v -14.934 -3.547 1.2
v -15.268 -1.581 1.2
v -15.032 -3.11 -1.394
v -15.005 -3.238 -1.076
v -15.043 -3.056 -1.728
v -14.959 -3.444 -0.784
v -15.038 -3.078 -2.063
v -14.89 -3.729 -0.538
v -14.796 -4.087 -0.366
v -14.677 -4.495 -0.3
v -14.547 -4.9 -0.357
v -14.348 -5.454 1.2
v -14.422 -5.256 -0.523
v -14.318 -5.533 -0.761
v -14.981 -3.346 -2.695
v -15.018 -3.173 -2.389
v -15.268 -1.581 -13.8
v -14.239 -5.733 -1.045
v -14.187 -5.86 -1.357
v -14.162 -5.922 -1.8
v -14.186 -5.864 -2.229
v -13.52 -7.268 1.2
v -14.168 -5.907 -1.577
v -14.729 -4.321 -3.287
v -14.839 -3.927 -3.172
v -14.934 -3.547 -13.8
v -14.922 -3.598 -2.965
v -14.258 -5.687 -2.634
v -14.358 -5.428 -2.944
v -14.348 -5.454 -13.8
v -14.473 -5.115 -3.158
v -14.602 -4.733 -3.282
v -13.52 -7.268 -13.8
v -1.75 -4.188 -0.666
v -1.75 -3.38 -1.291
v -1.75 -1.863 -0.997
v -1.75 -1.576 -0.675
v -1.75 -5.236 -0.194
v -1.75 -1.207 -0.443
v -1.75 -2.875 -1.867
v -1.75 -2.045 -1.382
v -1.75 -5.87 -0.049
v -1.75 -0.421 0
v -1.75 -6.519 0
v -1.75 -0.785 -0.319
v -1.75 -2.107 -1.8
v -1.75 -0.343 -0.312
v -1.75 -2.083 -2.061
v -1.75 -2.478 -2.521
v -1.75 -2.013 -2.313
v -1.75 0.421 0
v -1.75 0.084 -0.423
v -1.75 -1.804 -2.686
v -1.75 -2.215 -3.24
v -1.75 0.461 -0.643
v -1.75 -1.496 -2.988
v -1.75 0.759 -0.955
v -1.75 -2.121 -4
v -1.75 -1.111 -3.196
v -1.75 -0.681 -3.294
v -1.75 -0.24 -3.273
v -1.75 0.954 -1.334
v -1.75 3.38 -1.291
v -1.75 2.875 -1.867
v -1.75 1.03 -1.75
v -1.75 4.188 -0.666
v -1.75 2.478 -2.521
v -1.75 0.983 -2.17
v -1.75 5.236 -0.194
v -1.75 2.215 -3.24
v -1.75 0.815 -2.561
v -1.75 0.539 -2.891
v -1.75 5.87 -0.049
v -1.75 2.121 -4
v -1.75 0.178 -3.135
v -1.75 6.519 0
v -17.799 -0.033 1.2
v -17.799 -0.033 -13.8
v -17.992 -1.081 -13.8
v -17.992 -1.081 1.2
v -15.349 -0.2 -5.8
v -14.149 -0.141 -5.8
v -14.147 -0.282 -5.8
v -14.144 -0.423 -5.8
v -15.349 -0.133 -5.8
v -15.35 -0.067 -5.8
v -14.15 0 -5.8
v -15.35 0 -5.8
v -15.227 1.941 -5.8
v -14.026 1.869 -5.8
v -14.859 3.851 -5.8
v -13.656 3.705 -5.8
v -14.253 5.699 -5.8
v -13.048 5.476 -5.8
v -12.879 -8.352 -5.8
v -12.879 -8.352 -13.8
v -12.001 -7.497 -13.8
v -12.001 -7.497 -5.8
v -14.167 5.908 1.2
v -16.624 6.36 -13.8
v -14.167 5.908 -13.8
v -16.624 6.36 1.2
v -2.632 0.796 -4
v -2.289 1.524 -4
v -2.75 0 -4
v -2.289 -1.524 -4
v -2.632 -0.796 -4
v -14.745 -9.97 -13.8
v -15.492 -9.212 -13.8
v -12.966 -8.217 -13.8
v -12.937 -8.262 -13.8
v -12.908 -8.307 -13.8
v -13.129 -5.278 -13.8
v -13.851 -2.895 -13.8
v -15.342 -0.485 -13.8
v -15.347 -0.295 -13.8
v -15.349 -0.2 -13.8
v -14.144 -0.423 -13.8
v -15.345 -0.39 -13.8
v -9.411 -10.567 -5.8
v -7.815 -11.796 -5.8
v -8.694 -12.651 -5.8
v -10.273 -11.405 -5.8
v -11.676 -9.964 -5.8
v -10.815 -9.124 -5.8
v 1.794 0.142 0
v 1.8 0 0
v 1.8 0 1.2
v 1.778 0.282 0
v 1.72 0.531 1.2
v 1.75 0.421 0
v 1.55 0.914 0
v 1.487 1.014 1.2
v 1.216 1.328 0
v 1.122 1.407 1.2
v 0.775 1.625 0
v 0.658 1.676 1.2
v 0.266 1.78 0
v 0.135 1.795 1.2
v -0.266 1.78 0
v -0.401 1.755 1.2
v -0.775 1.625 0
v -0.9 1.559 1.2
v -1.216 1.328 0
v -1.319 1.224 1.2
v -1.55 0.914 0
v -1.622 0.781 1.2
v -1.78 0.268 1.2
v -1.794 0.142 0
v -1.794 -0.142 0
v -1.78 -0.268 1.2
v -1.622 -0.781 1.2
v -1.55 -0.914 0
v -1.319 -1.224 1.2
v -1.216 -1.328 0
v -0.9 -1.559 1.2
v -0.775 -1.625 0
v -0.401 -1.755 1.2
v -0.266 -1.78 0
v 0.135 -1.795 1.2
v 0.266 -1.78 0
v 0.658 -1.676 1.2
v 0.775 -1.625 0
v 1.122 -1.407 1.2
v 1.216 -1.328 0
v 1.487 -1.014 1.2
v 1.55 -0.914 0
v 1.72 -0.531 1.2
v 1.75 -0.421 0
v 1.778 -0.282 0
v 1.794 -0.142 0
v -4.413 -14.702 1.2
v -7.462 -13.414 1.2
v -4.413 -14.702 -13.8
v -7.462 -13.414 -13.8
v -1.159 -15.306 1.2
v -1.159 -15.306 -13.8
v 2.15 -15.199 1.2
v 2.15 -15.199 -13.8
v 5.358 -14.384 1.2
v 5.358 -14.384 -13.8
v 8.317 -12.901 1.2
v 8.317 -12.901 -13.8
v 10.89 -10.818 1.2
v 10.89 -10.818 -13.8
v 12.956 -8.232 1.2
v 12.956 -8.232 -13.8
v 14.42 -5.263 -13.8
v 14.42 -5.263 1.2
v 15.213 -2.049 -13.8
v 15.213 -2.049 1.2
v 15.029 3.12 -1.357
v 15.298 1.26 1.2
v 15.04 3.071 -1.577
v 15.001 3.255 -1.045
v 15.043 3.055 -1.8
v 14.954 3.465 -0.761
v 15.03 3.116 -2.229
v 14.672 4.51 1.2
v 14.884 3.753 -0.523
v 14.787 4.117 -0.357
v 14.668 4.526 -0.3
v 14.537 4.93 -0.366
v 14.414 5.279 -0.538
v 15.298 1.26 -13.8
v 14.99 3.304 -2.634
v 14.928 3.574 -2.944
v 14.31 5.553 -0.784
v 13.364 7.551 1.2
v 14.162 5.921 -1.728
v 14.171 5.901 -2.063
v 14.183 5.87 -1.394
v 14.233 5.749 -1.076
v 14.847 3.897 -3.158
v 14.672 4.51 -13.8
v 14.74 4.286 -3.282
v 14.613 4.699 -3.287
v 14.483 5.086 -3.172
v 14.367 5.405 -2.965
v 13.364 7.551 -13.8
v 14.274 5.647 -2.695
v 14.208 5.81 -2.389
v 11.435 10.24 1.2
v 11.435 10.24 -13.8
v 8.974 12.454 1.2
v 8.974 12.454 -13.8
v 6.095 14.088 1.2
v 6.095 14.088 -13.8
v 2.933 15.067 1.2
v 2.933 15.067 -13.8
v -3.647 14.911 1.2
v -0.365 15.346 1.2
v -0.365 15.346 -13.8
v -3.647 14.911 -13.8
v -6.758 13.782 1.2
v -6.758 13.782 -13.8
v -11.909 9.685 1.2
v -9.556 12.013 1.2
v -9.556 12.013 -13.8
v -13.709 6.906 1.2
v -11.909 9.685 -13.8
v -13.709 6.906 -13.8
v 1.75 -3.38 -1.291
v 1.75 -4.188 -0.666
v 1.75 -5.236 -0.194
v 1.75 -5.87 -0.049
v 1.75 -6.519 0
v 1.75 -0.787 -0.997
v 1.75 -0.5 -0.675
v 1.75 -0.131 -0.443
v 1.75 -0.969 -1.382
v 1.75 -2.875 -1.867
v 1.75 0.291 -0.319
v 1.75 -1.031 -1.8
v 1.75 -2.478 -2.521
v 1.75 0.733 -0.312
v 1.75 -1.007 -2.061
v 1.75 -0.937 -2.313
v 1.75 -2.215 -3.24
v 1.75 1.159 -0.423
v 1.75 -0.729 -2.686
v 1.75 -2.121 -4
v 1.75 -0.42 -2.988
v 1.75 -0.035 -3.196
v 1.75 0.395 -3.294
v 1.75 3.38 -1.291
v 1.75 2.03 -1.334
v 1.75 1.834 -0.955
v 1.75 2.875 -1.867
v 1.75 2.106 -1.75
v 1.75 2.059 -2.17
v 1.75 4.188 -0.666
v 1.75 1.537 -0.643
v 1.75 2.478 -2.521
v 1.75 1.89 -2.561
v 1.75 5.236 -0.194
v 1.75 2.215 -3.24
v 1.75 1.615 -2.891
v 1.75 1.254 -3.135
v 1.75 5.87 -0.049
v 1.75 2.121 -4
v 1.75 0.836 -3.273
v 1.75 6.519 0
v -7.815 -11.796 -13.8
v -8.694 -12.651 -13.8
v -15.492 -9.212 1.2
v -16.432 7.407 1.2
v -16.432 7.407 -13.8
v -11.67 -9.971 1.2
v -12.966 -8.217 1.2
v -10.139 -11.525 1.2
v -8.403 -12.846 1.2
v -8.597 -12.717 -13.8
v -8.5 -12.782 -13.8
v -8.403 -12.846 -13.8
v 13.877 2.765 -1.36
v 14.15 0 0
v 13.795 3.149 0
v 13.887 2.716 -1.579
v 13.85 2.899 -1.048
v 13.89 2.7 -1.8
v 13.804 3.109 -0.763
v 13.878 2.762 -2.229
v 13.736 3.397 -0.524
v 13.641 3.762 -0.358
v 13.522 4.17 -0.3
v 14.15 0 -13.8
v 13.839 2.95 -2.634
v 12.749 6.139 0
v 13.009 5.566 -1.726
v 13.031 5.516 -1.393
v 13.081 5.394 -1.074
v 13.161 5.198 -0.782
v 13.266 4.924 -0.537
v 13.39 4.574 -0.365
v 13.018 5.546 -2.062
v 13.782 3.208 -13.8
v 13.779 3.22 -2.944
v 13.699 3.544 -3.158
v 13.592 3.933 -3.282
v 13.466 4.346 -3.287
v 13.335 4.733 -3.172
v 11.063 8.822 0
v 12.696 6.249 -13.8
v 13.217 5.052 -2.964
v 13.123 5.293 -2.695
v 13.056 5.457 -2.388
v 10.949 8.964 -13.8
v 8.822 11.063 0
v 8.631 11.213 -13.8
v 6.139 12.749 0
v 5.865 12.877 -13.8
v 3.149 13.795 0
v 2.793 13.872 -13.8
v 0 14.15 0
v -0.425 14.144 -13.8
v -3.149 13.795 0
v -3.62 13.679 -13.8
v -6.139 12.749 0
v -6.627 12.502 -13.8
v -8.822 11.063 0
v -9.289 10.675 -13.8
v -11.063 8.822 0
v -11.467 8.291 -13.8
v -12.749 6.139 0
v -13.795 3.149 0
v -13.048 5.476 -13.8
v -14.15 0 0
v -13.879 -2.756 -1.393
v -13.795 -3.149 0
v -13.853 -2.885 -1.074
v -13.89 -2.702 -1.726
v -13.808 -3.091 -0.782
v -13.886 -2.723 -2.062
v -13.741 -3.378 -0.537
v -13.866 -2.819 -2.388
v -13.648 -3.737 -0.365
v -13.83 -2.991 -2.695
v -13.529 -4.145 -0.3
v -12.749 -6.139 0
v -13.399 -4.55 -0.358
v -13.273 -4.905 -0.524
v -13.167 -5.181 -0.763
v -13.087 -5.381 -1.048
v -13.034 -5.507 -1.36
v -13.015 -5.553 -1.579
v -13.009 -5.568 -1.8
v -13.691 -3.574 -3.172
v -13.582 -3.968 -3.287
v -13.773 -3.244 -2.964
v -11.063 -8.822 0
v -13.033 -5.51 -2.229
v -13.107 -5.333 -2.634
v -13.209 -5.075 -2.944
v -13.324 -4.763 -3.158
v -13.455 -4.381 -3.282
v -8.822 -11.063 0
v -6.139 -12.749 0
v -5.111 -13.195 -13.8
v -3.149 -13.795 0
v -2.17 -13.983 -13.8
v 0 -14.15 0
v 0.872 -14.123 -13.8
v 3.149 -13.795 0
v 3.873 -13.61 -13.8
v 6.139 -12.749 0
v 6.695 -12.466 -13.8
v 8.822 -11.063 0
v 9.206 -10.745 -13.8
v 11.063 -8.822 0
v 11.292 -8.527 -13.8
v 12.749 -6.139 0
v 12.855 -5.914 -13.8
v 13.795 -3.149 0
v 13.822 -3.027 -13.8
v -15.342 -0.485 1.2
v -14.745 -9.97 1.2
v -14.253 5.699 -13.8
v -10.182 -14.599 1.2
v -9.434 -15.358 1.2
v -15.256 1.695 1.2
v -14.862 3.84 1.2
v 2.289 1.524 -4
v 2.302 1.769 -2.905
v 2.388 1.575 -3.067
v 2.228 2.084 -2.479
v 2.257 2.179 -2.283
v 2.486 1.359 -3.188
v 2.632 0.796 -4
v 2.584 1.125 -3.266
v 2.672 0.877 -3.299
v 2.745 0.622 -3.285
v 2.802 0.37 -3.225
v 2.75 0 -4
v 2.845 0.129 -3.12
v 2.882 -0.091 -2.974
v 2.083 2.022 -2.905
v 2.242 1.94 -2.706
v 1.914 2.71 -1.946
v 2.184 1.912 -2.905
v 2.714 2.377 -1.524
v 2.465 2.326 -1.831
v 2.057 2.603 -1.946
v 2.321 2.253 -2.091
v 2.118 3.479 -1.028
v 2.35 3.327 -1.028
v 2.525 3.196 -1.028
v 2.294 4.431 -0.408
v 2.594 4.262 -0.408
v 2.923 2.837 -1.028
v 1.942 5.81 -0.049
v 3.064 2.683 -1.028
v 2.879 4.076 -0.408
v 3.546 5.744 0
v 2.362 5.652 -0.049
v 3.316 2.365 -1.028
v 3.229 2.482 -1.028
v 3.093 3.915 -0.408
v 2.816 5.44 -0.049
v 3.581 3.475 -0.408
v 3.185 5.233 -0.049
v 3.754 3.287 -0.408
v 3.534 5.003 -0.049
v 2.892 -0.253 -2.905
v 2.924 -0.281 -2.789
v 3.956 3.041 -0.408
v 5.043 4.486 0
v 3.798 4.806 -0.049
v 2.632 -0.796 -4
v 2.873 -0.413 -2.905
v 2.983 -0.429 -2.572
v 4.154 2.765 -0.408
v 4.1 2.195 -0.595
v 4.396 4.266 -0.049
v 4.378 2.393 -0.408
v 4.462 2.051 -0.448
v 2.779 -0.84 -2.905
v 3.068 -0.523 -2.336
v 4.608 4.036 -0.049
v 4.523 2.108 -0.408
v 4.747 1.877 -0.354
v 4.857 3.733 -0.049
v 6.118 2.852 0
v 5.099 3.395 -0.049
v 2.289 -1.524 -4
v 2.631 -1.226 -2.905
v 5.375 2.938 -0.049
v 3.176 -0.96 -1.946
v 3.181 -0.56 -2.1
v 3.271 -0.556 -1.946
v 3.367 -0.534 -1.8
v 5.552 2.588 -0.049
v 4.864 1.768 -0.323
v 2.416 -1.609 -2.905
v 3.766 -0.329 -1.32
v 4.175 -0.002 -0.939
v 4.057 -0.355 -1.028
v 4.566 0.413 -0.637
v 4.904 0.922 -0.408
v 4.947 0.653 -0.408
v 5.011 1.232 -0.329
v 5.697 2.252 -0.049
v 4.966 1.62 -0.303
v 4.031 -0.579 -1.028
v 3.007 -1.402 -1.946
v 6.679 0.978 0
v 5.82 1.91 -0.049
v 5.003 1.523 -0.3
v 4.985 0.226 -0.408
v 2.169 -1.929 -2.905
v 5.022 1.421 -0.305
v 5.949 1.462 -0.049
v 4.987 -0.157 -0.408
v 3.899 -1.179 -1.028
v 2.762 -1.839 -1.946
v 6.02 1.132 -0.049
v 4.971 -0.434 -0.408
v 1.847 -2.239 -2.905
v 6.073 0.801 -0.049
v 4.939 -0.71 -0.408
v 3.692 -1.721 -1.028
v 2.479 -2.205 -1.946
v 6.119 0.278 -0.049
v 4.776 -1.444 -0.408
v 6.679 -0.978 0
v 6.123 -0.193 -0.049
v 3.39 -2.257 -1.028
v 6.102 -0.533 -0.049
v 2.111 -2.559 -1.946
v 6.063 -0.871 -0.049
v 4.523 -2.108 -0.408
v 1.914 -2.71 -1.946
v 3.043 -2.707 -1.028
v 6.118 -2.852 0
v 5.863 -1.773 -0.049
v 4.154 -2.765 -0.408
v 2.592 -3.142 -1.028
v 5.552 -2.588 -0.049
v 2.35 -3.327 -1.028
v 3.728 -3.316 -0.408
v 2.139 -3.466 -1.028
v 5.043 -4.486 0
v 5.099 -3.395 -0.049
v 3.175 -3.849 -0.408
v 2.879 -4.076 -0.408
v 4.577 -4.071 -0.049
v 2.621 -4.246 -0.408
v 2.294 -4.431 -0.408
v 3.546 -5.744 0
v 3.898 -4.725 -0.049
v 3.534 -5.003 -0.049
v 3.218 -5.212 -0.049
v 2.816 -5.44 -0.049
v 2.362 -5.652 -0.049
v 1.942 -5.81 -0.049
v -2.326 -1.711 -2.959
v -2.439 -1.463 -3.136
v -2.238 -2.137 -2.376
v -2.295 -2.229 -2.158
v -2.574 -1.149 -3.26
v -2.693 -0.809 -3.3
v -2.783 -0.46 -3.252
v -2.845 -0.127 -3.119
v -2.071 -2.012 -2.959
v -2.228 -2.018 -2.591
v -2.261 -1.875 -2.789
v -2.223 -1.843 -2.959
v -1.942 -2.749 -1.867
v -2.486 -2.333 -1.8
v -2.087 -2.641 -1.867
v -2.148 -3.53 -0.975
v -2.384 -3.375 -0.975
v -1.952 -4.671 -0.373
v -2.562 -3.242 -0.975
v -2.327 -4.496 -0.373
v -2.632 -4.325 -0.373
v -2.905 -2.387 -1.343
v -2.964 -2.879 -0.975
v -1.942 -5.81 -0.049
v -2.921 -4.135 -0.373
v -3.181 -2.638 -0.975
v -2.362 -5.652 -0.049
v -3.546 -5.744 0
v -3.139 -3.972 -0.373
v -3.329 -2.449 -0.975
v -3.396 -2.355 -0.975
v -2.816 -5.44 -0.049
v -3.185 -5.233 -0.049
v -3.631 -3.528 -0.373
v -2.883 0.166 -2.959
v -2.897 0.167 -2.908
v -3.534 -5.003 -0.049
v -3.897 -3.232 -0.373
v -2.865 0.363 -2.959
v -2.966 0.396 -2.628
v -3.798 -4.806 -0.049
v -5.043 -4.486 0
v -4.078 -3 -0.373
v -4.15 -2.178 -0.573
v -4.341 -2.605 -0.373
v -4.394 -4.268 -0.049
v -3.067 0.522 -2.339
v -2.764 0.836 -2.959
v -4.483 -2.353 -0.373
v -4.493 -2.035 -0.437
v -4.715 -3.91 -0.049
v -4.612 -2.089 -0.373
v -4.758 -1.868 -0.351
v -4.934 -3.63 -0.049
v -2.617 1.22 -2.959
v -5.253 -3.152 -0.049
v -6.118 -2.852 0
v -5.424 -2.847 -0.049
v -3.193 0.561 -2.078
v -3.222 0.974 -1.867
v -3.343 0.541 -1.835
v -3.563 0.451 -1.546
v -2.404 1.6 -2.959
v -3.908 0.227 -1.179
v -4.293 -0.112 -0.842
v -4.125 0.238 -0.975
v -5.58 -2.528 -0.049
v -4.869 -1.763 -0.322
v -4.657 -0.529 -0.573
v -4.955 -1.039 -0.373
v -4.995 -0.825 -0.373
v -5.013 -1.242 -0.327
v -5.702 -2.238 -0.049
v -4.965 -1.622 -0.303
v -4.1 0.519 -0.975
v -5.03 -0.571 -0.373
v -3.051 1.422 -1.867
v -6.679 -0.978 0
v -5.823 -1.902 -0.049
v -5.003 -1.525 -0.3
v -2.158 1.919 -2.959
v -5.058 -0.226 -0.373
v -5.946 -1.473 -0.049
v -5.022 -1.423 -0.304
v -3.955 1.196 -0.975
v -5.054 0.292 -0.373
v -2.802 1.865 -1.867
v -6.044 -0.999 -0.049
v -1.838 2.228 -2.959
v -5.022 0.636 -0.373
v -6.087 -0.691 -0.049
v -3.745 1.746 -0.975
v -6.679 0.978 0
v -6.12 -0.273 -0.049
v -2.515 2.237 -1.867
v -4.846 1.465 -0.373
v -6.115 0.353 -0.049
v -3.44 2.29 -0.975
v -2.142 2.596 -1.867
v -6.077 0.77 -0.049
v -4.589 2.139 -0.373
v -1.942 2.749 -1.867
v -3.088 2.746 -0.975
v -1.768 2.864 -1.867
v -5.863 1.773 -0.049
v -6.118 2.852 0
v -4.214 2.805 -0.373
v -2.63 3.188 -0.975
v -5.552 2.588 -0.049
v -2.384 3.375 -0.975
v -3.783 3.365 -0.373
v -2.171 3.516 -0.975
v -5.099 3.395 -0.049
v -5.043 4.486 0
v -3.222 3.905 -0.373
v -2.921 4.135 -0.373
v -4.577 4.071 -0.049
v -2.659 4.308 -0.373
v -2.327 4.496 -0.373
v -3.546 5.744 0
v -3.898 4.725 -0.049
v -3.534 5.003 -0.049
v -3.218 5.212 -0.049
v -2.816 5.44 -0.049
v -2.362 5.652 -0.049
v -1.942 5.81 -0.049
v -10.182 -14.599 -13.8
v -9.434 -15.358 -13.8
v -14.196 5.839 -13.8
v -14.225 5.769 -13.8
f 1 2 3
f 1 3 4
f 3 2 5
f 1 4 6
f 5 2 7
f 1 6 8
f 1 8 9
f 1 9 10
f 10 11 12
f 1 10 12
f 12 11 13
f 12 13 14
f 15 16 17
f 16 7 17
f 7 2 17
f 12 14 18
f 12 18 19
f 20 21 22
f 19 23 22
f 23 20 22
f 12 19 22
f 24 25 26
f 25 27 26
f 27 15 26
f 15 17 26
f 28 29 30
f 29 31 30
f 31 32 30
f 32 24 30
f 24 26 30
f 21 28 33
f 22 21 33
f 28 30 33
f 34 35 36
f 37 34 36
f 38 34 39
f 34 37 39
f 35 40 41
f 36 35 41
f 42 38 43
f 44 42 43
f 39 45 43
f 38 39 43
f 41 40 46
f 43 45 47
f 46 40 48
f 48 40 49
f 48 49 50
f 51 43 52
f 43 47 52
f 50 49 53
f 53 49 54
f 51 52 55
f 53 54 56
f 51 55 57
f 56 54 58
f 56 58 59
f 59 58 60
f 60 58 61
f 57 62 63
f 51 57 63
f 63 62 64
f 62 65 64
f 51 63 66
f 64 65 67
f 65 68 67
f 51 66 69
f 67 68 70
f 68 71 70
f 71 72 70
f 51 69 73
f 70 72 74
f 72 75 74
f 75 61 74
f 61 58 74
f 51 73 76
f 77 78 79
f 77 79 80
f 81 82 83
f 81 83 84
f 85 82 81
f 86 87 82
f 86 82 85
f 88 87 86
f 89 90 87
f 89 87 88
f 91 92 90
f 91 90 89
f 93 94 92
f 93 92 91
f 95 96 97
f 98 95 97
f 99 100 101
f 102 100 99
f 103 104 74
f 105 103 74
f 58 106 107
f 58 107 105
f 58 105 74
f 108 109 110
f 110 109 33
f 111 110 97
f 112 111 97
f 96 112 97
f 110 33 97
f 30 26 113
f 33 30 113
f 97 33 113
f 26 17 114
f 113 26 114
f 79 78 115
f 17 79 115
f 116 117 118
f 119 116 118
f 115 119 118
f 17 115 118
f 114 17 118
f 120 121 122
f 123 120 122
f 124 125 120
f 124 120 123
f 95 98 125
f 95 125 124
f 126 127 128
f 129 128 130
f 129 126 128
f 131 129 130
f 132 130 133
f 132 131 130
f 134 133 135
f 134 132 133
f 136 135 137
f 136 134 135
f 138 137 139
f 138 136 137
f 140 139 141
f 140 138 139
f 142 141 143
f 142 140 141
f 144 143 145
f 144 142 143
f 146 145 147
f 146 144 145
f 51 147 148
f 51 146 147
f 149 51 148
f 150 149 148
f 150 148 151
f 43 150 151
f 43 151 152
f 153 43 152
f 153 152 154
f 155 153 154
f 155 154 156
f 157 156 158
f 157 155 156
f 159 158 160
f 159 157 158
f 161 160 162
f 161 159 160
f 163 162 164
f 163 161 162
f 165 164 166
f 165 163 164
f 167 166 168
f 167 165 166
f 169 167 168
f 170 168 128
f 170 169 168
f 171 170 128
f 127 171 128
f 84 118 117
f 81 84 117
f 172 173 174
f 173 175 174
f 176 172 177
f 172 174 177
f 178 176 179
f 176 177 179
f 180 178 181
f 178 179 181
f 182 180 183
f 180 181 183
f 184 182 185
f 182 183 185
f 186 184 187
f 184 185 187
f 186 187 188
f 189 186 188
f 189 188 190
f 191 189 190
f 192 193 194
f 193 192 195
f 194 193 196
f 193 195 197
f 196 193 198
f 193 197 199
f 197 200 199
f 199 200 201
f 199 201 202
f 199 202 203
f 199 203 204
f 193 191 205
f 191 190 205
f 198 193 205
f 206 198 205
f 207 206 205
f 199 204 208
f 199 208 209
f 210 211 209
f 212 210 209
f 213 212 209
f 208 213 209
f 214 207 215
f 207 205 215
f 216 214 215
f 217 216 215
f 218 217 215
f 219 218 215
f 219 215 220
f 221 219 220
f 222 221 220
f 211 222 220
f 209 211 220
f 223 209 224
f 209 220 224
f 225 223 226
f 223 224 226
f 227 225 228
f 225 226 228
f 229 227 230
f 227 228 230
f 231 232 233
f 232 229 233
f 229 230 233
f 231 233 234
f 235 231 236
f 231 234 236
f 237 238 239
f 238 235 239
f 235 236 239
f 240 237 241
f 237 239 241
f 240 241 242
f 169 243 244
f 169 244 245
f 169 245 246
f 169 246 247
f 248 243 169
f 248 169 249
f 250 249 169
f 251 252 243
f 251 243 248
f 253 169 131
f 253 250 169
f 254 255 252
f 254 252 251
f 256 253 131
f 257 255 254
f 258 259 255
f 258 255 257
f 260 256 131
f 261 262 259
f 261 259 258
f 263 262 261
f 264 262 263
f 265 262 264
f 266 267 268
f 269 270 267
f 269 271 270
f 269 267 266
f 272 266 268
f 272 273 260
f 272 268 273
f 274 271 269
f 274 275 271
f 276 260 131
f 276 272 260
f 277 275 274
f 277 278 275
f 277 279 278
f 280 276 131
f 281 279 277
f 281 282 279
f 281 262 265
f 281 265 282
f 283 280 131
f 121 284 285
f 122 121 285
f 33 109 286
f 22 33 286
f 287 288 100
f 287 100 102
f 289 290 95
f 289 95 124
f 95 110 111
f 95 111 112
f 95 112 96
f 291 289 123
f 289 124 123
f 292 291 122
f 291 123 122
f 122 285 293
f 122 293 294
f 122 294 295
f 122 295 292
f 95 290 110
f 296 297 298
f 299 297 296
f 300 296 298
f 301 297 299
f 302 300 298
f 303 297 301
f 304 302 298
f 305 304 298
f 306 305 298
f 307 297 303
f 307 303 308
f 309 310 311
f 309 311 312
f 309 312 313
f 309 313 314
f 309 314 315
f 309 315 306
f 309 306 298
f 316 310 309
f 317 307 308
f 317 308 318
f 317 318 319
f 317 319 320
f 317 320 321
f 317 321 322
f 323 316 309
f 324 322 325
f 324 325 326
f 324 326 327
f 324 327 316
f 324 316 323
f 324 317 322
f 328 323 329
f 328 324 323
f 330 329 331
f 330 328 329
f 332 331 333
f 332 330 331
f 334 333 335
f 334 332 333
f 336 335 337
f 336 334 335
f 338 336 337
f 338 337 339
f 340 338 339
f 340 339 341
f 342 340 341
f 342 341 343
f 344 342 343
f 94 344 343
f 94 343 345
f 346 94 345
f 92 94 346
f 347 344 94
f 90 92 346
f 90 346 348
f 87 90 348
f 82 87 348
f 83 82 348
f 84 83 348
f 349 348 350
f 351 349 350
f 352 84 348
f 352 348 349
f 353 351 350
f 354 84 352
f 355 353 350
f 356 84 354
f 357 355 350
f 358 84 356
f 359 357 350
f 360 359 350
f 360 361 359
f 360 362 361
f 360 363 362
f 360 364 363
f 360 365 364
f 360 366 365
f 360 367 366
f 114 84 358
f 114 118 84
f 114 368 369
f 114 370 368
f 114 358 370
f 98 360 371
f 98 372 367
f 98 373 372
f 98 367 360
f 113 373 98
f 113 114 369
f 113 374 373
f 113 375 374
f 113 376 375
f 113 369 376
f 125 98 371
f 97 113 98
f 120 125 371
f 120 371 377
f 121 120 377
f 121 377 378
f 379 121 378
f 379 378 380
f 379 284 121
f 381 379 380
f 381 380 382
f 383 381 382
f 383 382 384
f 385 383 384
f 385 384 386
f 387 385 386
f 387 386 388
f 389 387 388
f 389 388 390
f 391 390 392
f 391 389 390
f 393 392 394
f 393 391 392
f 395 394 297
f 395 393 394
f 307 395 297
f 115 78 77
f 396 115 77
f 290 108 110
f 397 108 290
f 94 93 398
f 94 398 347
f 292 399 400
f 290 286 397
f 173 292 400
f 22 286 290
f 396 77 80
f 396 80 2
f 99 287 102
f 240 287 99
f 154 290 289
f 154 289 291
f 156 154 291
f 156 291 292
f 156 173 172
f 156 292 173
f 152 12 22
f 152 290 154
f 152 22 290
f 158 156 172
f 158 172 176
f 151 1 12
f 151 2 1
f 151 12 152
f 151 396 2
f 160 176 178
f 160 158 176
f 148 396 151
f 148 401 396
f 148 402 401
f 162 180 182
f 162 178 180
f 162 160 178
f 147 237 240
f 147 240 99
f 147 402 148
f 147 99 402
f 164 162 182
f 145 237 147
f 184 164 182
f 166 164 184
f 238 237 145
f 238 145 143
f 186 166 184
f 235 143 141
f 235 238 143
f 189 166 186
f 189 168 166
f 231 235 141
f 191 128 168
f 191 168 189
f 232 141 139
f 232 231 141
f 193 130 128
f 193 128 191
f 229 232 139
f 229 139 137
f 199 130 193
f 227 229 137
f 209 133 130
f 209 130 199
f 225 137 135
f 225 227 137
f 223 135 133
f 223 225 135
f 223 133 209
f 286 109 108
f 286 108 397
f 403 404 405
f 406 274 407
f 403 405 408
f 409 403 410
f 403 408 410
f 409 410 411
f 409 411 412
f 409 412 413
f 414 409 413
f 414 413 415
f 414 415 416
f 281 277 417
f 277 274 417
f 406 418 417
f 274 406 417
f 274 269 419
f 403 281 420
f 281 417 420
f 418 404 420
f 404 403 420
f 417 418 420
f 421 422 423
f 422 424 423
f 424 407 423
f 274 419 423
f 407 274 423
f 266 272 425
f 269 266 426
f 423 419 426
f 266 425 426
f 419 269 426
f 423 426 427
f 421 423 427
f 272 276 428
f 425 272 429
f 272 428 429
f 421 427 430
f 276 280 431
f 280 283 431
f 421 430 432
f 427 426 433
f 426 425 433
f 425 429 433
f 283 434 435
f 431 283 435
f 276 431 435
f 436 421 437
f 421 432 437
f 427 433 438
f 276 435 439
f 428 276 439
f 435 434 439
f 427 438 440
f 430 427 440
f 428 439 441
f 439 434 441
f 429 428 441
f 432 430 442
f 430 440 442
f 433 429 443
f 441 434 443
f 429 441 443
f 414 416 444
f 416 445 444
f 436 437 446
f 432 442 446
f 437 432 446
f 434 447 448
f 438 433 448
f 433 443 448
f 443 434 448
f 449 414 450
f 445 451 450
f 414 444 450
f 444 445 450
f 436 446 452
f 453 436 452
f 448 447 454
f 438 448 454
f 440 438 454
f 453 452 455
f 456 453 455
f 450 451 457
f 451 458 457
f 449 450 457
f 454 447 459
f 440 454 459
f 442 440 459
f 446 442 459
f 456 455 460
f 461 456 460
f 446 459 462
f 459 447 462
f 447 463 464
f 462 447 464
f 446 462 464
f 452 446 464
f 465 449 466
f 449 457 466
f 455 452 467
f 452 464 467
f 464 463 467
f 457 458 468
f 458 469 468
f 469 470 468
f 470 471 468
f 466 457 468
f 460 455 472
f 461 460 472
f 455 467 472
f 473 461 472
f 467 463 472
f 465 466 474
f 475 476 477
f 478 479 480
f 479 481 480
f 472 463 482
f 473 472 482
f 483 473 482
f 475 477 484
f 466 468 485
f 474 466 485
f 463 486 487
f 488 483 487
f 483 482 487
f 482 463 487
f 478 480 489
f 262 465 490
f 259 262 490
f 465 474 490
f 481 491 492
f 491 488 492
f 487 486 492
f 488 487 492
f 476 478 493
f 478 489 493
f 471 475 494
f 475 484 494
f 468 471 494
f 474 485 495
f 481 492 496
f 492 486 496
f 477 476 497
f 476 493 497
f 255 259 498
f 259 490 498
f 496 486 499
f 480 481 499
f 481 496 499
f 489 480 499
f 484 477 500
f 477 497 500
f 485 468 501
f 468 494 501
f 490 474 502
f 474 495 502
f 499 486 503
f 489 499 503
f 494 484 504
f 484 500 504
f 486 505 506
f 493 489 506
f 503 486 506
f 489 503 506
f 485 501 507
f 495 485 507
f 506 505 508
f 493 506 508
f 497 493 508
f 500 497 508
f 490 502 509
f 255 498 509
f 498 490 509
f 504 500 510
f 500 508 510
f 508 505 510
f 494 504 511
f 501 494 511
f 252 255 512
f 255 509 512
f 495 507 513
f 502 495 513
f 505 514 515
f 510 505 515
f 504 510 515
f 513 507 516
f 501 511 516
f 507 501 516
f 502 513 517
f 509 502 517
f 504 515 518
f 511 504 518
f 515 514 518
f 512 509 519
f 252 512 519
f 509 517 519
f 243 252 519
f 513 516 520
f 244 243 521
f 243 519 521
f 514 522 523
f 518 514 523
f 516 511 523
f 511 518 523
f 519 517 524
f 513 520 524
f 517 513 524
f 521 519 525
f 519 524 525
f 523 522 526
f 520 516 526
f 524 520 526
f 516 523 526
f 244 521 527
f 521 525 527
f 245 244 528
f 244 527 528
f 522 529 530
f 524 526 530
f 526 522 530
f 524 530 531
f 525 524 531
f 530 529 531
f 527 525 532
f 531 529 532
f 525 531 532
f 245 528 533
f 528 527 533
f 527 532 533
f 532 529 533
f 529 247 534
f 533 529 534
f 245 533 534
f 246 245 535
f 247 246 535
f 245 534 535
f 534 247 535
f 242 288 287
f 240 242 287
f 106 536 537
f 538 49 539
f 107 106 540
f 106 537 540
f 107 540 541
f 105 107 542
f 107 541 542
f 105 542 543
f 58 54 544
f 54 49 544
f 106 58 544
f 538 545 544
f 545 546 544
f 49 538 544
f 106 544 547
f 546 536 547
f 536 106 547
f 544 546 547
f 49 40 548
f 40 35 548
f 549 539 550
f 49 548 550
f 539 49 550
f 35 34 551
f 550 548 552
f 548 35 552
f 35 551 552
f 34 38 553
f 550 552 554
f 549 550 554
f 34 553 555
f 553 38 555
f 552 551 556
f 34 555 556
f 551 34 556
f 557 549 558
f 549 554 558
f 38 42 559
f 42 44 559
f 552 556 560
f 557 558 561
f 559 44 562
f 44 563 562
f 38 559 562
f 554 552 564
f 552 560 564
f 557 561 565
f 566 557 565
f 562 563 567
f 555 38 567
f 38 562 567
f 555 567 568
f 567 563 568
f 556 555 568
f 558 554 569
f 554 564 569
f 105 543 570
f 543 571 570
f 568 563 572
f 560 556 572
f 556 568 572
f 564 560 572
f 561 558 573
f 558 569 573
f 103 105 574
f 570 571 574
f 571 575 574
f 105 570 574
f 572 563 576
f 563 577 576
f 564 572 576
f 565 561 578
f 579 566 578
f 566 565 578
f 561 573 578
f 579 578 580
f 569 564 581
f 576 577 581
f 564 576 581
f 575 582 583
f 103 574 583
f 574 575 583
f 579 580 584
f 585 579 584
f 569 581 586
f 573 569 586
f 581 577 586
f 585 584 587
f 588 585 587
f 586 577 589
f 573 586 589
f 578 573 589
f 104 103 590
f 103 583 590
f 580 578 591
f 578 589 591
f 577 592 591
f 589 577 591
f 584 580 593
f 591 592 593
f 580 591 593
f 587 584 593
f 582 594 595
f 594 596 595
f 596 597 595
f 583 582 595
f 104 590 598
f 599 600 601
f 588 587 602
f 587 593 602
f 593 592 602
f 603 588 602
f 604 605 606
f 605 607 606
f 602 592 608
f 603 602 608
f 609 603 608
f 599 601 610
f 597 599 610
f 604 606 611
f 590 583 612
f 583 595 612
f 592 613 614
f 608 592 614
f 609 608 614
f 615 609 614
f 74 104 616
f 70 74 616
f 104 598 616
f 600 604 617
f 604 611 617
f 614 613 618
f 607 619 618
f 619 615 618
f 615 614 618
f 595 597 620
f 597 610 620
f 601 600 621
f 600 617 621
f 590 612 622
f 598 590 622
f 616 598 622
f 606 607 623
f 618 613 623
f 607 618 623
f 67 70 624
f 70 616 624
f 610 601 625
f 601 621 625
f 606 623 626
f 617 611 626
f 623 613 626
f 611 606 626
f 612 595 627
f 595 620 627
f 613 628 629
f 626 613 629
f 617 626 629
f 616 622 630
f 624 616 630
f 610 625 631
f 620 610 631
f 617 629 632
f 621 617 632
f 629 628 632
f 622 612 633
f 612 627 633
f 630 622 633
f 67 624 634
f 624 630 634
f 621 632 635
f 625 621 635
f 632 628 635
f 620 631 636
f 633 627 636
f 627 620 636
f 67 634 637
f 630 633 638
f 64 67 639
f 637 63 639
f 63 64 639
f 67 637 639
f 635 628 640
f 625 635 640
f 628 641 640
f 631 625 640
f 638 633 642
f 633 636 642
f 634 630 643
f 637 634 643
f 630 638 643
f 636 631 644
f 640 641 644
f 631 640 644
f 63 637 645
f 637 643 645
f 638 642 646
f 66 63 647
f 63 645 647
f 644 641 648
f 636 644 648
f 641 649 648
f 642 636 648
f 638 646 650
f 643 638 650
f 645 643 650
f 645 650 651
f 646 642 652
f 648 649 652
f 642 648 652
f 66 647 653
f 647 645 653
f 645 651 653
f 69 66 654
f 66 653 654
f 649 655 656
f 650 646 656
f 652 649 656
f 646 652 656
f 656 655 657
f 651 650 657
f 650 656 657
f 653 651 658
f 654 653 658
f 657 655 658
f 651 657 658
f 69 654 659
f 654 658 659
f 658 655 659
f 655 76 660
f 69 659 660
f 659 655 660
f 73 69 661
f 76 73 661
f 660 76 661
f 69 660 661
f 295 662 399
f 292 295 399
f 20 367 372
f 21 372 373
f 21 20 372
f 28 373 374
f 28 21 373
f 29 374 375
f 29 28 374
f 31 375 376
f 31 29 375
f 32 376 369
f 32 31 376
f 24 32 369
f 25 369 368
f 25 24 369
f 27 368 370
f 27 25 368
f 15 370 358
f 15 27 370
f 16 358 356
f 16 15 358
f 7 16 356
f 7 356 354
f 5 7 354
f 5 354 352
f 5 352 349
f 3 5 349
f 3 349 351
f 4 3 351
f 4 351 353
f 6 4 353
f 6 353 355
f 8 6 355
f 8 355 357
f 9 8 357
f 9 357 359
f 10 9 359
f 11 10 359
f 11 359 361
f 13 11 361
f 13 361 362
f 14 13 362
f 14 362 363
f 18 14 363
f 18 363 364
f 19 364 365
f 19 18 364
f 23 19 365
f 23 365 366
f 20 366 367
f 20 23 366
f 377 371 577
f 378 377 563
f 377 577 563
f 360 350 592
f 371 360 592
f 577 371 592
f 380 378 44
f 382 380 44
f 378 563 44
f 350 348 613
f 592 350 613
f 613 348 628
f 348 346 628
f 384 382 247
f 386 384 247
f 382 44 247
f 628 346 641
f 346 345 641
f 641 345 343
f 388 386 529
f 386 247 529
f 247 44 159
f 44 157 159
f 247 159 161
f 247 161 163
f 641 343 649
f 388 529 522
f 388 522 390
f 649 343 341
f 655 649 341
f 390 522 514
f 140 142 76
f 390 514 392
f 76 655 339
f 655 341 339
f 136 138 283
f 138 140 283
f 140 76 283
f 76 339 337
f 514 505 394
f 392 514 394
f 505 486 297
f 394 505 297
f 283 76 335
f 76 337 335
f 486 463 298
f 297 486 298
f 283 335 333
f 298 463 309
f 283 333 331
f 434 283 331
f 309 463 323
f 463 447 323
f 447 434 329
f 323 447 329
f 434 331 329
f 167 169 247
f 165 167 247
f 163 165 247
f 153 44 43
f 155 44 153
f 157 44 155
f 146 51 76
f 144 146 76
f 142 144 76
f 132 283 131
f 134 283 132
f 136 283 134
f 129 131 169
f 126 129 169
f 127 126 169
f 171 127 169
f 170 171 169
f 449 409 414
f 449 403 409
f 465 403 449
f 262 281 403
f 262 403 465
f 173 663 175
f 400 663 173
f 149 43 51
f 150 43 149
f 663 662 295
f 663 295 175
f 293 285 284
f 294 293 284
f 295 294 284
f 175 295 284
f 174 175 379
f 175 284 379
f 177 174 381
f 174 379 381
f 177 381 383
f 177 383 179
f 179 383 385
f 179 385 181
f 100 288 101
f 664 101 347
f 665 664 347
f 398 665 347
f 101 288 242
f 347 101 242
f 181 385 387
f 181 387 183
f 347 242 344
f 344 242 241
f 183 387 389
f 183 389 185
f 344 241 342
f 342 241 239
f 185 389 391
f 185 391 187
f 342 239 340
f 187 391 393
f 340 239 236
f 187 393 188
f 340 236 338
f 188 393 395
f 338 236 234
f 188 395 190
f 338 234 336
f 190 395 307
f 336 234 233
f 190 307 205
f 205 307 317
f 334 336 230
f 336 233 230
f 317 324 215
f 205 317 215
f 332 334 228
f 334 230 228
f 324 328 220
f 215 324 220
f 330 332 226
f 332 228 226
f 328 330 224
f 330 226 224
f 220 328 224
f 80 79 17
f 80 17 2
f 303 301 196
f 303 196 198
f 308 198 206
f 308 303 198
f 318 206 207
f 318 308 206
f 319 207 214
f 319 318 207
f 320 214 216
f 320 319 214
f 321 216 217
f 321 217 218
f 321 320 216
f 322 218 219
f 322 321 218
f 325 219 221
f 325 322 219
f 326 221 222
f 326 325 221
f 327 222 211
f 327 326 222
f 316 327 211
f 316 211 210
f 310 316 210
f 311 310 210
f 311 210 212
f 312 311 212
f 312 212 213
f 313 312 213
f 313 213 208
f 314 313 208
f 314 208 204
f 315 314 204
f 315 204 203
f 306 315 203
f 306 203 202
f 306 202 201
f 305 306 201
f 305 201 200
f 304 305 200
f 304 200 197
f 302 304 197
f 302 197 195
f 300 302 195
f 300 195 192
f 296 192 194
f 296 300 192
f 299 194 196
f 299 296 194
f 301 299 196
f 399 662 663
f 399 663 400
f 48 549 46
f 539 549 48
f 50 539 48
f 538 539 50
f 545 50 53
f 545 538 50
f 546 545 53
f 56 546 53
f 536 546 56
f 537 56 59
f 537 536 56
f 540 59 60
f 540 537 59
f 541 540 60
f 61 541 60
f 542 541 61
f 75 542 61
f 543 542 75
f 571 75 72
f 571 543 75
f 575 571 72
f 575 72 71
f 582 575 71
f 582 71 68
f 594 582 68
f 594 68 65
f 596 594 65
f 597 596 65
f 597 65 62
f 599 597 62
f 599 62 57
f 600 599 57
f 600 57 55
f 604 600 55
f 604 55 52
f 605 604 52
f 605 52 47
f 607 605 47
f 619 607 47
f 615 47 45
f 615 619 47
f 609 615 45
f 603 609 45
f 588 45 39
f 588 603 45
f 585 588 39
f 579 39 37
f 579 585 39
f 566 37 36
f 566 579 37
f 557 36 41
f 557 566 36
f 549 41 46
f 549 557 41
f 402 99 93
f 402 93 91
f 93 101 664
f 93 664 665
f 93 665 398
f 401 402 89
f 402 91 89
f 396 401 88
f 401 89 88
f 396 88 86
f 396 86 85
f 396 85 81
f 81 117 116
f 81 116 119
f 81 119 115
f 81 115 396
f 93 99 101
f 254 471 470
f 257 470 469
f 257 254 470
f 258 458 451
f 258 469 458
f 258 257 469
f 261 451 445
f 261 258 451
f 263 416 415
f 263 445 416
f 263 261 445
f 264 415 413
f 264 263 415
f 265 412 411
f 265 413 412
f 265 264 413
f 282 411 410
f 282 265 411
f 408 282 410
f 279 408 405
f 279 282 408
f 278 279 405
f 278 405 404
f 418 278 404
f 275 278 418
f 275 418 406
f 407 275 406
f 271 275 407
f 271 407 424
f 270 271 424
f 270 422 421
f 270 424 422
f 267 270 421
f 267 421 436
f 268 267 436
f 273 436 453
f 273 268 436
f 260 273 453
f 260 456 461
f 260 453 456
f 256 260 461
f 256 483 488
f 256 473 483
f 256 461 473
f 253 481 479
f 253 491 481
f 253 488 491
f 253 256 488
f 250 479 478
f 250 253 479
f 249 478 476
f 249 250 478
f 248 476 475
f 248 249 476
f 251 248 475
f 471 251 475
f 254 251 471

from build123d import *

# Parameters (mm, degrees)
SKETCH1_R                = 14.15
SKETCH1_R_2              = 1.8
BOSS_EXTRUDE1_DEPTH      = 1.2
BOSS_EXTRUDE2_START      = -15
SKETCH3_R                = 15.35
SKETCH3_R_2              = 14.15
BOSS_EXTRUDE2_DEPTH      = 15
CUT_EXTRUDE2_DEPTH       = 8
BOSS_EXTRUDE3_REACH      = 43.566
BOSS_EXTRUDE3_END_RADIUS = 15.35
SKETCH6_W                = 15
SKETCH6_H                = 1.064778235
CIRPATTERN1_COUNT        = 2
CIRPATTERN1_ANGLE        = 305
SKETCH7_R                = 2.75
SKETCH7_R_2              = 1.75
BOSS_EXTRUDE4_DEPTH      = 4
FILLET1_R                = 4
SKETCH8_W                = 3.5
SKETCH8_H                = 15.633258876
CUT_EXTRUDE3_DEPTH       = 4
SKETCH4_R                = 1.5
CUT_EXTRUDE1_DEPTH       = 37


with BuildPart() as part:
    # Sketch1 → Boss-Extrude1 (new body)
    with BuildSketch(Plane.XY):
        Circle(SKETCH1_R)
        Circle(SKETCH1_R_2, mode=Mode.SUBTRACT)
    extrude(amount=BOSS_EXTRUDE1_DEPTH)

    # Sketch3 → Boss-Extrude2 (add)
    with BuildSketch(Plane.XY.offset(1.2).offset(BOSS_EXTRUDE2_START)):
        Circle(SKETCH3_R)
        Circle(SKETCH3_R_2, mode=Mode.SUBTRACT)
    extrude(amount=BOSS_EXTRUDE2_DEPTH)

    # Sketch5 → Cut-Extrude2 (cut)
    with BuildSketch(Plane(origin=(0, 0, -13.8), x_dir=(-1, 0, 0), z_dir=(0, 0, -1))):
        with BuildLine():
            Line((14.252659556, 5.699490817), (13.047619315, 5.47559405))
            ThreePointArc((13.047619315, 5.47559405), (13.871667407, 2.792730446), (14.15, 0))
            ThreePointArc((14.15, 0), (14.148415567, -0.21174737), (14.143662622, -0.423447319))
            Line((14.143662622, -0.423447319), (15.348702863, -0.199550552))
            ThreePointArc((15.348702863, -0.199550552), (15.349675712, -0.099777384), (15.35, 0))
            ThreePointArc((15.35, 0), (15.073168615, 2.902083373), (14.252659556, 5.699490817))
        make_face()
        with BuildLine():
            ThreePointArc((12.000869192, -7.496775216), (10.138626321, -9.870701916), (7.815412549, -11.79583938))
            Line((7.815412549, -11.79583938), (8.693613767, -12.650833161))
            ThreePointArc((8.693613767, -12.650833161), (10.998439154, -10.707793245), (12.87907041, -8.351768997))
            Line((12.87907041, -8.351768997), (12.000869192, -7.496775216))
        make_face()
    extrude(amount=-CUT_EXTRUDE2_DEPTH, mode=Mode.SUBTRACT)

    # Boss-Extrude3: up to this cylinder (the profile starts outside it)
    boss_extrude3_end = Plane(origin=(0, 0, -6.3), z_dir=(0, 0, 1)) * Cylinder(BOSS_EXTRUDE3_END_RADIUS, 118.832, mode=Mode.PRIVATE)
    # Sketch6 → Boss-Extrude3 (add, up to the surface)
    with BuildSketch(Plane(origin=(-12.463353061, -12.28473974, 0), x_dir=(0, 0, 1), z_dir=(-0.7121916034988102, -0.7019851279804962, 0)), mode=Mode.PRIVATE) as boss_extrude3_sk1:
        with Locations((-6.3, -3.782389118)):
            Rectangle(SKETCH6_W, SKETCH6_H)
    boss_extrude3_tool1 = extrude(boss_extrude3_sk1.sketch, amount=-BOSS_EXTRUDE3_REACH, mode=Mode.PRIVATE) - boss_extrude3_end
    # Sketch6 → Boss-Extrude3 (add, up to the surface)
    with BuildSketch(Plane(origin=(-12.463353061, -12.28473974, 0), x_dir=(0, 0, 1), z_dir=(-0.7121916034988102, -0.7019851279804962, 0)), mode=Mode.PRIVATE) as boss_extrude3_sk2:
        with Locations((-6.3, 3.782389118)):
            Rectangle(SKETCH6_W, SKETCH6_H)
    boss_extrude3_tool2 = extrude(boss_extrude3_sk2.sketch, amount=-BOSS_EXTRUDE3_REACH, mode=Mode.PRIVATE) - boss_extrude3_end
    boss_extrude3 = boss_extrude3_tool1.solids().sort_by_distance((-9.808172, -14.978526, -6.3))[0] + boss_extrude3_tool2.solids().sort_by_distance((-15.118534, -9.590954, -6.3))[0]
    add(boss_extrude3)

    # CirPattern1: Boss-Extrude3 ×2 about axis
    cirpattern1_axis = Axis((0, 0, 0), (0, 0, 1))
    for i in range(1, CIRPATTERN1_COUNT):
        add(boss_extrude3.rotate(cirpattern1_axis, i * CIRPATTERN1_ANGLE / (CIRPATTERN1_COUNT - 1)))

    # Sketch7 → Boss-Extrude4 (add)
    with BuildSketch(Plane(origin=(0, 0, 0), x_dir=(-1, 0, 0), z_dir=(0, 0, -1))):
        with Locations(Location((0, 0, 0), (0, 0, 180))):
            Circle(SKETCH7_R)
        Circle(SKETCH7_R_2, mode=Mode.SUBTRACT)
    extrude(amount=BOSS_EXTRUDE4_DEPTH)

    # Fillet1
    fillet1_edges = [part.edges().sort_by_distance(p)[0] for p in [
        (-2.75, 0, 0),
    ]]
    fillet(fillet1_edges, radius=FILLET1_R - 0.0001)  # a hair under: the kernel refuses the full size

    # Sketch8 → Cut-Extrude3 (cut)
    with BuildSketch(Plane(origin=(0, 0, -4), x_dir=(-1, 0, 0), z_dir=(0, 0, -1))):
        Rectangle(SKETCH8_W, SKETCH8_H)
    extrude(amount=-CUT_EXTRUDE3_DEPTH, mode=Mode.SUBTRACT)

    # Sketch4 → Cut-Extrude1 (cut)
    with BuildSketch(Plane(origin=(-17.515032447, -2.63115554, 0), x_dir=(0.293814927975495, -0.9558623269586236, 0), z_dir=(0.9558623269586236, 0.293814927975495, 0))):
        with Locations((2.63115554, 1.8)):
            Circle(SKETCH4_R)
    extrude(amount=CUT_EXTRUDE1_DEPTH, mode=Mode.SUBTRACT)


solid = part.part
